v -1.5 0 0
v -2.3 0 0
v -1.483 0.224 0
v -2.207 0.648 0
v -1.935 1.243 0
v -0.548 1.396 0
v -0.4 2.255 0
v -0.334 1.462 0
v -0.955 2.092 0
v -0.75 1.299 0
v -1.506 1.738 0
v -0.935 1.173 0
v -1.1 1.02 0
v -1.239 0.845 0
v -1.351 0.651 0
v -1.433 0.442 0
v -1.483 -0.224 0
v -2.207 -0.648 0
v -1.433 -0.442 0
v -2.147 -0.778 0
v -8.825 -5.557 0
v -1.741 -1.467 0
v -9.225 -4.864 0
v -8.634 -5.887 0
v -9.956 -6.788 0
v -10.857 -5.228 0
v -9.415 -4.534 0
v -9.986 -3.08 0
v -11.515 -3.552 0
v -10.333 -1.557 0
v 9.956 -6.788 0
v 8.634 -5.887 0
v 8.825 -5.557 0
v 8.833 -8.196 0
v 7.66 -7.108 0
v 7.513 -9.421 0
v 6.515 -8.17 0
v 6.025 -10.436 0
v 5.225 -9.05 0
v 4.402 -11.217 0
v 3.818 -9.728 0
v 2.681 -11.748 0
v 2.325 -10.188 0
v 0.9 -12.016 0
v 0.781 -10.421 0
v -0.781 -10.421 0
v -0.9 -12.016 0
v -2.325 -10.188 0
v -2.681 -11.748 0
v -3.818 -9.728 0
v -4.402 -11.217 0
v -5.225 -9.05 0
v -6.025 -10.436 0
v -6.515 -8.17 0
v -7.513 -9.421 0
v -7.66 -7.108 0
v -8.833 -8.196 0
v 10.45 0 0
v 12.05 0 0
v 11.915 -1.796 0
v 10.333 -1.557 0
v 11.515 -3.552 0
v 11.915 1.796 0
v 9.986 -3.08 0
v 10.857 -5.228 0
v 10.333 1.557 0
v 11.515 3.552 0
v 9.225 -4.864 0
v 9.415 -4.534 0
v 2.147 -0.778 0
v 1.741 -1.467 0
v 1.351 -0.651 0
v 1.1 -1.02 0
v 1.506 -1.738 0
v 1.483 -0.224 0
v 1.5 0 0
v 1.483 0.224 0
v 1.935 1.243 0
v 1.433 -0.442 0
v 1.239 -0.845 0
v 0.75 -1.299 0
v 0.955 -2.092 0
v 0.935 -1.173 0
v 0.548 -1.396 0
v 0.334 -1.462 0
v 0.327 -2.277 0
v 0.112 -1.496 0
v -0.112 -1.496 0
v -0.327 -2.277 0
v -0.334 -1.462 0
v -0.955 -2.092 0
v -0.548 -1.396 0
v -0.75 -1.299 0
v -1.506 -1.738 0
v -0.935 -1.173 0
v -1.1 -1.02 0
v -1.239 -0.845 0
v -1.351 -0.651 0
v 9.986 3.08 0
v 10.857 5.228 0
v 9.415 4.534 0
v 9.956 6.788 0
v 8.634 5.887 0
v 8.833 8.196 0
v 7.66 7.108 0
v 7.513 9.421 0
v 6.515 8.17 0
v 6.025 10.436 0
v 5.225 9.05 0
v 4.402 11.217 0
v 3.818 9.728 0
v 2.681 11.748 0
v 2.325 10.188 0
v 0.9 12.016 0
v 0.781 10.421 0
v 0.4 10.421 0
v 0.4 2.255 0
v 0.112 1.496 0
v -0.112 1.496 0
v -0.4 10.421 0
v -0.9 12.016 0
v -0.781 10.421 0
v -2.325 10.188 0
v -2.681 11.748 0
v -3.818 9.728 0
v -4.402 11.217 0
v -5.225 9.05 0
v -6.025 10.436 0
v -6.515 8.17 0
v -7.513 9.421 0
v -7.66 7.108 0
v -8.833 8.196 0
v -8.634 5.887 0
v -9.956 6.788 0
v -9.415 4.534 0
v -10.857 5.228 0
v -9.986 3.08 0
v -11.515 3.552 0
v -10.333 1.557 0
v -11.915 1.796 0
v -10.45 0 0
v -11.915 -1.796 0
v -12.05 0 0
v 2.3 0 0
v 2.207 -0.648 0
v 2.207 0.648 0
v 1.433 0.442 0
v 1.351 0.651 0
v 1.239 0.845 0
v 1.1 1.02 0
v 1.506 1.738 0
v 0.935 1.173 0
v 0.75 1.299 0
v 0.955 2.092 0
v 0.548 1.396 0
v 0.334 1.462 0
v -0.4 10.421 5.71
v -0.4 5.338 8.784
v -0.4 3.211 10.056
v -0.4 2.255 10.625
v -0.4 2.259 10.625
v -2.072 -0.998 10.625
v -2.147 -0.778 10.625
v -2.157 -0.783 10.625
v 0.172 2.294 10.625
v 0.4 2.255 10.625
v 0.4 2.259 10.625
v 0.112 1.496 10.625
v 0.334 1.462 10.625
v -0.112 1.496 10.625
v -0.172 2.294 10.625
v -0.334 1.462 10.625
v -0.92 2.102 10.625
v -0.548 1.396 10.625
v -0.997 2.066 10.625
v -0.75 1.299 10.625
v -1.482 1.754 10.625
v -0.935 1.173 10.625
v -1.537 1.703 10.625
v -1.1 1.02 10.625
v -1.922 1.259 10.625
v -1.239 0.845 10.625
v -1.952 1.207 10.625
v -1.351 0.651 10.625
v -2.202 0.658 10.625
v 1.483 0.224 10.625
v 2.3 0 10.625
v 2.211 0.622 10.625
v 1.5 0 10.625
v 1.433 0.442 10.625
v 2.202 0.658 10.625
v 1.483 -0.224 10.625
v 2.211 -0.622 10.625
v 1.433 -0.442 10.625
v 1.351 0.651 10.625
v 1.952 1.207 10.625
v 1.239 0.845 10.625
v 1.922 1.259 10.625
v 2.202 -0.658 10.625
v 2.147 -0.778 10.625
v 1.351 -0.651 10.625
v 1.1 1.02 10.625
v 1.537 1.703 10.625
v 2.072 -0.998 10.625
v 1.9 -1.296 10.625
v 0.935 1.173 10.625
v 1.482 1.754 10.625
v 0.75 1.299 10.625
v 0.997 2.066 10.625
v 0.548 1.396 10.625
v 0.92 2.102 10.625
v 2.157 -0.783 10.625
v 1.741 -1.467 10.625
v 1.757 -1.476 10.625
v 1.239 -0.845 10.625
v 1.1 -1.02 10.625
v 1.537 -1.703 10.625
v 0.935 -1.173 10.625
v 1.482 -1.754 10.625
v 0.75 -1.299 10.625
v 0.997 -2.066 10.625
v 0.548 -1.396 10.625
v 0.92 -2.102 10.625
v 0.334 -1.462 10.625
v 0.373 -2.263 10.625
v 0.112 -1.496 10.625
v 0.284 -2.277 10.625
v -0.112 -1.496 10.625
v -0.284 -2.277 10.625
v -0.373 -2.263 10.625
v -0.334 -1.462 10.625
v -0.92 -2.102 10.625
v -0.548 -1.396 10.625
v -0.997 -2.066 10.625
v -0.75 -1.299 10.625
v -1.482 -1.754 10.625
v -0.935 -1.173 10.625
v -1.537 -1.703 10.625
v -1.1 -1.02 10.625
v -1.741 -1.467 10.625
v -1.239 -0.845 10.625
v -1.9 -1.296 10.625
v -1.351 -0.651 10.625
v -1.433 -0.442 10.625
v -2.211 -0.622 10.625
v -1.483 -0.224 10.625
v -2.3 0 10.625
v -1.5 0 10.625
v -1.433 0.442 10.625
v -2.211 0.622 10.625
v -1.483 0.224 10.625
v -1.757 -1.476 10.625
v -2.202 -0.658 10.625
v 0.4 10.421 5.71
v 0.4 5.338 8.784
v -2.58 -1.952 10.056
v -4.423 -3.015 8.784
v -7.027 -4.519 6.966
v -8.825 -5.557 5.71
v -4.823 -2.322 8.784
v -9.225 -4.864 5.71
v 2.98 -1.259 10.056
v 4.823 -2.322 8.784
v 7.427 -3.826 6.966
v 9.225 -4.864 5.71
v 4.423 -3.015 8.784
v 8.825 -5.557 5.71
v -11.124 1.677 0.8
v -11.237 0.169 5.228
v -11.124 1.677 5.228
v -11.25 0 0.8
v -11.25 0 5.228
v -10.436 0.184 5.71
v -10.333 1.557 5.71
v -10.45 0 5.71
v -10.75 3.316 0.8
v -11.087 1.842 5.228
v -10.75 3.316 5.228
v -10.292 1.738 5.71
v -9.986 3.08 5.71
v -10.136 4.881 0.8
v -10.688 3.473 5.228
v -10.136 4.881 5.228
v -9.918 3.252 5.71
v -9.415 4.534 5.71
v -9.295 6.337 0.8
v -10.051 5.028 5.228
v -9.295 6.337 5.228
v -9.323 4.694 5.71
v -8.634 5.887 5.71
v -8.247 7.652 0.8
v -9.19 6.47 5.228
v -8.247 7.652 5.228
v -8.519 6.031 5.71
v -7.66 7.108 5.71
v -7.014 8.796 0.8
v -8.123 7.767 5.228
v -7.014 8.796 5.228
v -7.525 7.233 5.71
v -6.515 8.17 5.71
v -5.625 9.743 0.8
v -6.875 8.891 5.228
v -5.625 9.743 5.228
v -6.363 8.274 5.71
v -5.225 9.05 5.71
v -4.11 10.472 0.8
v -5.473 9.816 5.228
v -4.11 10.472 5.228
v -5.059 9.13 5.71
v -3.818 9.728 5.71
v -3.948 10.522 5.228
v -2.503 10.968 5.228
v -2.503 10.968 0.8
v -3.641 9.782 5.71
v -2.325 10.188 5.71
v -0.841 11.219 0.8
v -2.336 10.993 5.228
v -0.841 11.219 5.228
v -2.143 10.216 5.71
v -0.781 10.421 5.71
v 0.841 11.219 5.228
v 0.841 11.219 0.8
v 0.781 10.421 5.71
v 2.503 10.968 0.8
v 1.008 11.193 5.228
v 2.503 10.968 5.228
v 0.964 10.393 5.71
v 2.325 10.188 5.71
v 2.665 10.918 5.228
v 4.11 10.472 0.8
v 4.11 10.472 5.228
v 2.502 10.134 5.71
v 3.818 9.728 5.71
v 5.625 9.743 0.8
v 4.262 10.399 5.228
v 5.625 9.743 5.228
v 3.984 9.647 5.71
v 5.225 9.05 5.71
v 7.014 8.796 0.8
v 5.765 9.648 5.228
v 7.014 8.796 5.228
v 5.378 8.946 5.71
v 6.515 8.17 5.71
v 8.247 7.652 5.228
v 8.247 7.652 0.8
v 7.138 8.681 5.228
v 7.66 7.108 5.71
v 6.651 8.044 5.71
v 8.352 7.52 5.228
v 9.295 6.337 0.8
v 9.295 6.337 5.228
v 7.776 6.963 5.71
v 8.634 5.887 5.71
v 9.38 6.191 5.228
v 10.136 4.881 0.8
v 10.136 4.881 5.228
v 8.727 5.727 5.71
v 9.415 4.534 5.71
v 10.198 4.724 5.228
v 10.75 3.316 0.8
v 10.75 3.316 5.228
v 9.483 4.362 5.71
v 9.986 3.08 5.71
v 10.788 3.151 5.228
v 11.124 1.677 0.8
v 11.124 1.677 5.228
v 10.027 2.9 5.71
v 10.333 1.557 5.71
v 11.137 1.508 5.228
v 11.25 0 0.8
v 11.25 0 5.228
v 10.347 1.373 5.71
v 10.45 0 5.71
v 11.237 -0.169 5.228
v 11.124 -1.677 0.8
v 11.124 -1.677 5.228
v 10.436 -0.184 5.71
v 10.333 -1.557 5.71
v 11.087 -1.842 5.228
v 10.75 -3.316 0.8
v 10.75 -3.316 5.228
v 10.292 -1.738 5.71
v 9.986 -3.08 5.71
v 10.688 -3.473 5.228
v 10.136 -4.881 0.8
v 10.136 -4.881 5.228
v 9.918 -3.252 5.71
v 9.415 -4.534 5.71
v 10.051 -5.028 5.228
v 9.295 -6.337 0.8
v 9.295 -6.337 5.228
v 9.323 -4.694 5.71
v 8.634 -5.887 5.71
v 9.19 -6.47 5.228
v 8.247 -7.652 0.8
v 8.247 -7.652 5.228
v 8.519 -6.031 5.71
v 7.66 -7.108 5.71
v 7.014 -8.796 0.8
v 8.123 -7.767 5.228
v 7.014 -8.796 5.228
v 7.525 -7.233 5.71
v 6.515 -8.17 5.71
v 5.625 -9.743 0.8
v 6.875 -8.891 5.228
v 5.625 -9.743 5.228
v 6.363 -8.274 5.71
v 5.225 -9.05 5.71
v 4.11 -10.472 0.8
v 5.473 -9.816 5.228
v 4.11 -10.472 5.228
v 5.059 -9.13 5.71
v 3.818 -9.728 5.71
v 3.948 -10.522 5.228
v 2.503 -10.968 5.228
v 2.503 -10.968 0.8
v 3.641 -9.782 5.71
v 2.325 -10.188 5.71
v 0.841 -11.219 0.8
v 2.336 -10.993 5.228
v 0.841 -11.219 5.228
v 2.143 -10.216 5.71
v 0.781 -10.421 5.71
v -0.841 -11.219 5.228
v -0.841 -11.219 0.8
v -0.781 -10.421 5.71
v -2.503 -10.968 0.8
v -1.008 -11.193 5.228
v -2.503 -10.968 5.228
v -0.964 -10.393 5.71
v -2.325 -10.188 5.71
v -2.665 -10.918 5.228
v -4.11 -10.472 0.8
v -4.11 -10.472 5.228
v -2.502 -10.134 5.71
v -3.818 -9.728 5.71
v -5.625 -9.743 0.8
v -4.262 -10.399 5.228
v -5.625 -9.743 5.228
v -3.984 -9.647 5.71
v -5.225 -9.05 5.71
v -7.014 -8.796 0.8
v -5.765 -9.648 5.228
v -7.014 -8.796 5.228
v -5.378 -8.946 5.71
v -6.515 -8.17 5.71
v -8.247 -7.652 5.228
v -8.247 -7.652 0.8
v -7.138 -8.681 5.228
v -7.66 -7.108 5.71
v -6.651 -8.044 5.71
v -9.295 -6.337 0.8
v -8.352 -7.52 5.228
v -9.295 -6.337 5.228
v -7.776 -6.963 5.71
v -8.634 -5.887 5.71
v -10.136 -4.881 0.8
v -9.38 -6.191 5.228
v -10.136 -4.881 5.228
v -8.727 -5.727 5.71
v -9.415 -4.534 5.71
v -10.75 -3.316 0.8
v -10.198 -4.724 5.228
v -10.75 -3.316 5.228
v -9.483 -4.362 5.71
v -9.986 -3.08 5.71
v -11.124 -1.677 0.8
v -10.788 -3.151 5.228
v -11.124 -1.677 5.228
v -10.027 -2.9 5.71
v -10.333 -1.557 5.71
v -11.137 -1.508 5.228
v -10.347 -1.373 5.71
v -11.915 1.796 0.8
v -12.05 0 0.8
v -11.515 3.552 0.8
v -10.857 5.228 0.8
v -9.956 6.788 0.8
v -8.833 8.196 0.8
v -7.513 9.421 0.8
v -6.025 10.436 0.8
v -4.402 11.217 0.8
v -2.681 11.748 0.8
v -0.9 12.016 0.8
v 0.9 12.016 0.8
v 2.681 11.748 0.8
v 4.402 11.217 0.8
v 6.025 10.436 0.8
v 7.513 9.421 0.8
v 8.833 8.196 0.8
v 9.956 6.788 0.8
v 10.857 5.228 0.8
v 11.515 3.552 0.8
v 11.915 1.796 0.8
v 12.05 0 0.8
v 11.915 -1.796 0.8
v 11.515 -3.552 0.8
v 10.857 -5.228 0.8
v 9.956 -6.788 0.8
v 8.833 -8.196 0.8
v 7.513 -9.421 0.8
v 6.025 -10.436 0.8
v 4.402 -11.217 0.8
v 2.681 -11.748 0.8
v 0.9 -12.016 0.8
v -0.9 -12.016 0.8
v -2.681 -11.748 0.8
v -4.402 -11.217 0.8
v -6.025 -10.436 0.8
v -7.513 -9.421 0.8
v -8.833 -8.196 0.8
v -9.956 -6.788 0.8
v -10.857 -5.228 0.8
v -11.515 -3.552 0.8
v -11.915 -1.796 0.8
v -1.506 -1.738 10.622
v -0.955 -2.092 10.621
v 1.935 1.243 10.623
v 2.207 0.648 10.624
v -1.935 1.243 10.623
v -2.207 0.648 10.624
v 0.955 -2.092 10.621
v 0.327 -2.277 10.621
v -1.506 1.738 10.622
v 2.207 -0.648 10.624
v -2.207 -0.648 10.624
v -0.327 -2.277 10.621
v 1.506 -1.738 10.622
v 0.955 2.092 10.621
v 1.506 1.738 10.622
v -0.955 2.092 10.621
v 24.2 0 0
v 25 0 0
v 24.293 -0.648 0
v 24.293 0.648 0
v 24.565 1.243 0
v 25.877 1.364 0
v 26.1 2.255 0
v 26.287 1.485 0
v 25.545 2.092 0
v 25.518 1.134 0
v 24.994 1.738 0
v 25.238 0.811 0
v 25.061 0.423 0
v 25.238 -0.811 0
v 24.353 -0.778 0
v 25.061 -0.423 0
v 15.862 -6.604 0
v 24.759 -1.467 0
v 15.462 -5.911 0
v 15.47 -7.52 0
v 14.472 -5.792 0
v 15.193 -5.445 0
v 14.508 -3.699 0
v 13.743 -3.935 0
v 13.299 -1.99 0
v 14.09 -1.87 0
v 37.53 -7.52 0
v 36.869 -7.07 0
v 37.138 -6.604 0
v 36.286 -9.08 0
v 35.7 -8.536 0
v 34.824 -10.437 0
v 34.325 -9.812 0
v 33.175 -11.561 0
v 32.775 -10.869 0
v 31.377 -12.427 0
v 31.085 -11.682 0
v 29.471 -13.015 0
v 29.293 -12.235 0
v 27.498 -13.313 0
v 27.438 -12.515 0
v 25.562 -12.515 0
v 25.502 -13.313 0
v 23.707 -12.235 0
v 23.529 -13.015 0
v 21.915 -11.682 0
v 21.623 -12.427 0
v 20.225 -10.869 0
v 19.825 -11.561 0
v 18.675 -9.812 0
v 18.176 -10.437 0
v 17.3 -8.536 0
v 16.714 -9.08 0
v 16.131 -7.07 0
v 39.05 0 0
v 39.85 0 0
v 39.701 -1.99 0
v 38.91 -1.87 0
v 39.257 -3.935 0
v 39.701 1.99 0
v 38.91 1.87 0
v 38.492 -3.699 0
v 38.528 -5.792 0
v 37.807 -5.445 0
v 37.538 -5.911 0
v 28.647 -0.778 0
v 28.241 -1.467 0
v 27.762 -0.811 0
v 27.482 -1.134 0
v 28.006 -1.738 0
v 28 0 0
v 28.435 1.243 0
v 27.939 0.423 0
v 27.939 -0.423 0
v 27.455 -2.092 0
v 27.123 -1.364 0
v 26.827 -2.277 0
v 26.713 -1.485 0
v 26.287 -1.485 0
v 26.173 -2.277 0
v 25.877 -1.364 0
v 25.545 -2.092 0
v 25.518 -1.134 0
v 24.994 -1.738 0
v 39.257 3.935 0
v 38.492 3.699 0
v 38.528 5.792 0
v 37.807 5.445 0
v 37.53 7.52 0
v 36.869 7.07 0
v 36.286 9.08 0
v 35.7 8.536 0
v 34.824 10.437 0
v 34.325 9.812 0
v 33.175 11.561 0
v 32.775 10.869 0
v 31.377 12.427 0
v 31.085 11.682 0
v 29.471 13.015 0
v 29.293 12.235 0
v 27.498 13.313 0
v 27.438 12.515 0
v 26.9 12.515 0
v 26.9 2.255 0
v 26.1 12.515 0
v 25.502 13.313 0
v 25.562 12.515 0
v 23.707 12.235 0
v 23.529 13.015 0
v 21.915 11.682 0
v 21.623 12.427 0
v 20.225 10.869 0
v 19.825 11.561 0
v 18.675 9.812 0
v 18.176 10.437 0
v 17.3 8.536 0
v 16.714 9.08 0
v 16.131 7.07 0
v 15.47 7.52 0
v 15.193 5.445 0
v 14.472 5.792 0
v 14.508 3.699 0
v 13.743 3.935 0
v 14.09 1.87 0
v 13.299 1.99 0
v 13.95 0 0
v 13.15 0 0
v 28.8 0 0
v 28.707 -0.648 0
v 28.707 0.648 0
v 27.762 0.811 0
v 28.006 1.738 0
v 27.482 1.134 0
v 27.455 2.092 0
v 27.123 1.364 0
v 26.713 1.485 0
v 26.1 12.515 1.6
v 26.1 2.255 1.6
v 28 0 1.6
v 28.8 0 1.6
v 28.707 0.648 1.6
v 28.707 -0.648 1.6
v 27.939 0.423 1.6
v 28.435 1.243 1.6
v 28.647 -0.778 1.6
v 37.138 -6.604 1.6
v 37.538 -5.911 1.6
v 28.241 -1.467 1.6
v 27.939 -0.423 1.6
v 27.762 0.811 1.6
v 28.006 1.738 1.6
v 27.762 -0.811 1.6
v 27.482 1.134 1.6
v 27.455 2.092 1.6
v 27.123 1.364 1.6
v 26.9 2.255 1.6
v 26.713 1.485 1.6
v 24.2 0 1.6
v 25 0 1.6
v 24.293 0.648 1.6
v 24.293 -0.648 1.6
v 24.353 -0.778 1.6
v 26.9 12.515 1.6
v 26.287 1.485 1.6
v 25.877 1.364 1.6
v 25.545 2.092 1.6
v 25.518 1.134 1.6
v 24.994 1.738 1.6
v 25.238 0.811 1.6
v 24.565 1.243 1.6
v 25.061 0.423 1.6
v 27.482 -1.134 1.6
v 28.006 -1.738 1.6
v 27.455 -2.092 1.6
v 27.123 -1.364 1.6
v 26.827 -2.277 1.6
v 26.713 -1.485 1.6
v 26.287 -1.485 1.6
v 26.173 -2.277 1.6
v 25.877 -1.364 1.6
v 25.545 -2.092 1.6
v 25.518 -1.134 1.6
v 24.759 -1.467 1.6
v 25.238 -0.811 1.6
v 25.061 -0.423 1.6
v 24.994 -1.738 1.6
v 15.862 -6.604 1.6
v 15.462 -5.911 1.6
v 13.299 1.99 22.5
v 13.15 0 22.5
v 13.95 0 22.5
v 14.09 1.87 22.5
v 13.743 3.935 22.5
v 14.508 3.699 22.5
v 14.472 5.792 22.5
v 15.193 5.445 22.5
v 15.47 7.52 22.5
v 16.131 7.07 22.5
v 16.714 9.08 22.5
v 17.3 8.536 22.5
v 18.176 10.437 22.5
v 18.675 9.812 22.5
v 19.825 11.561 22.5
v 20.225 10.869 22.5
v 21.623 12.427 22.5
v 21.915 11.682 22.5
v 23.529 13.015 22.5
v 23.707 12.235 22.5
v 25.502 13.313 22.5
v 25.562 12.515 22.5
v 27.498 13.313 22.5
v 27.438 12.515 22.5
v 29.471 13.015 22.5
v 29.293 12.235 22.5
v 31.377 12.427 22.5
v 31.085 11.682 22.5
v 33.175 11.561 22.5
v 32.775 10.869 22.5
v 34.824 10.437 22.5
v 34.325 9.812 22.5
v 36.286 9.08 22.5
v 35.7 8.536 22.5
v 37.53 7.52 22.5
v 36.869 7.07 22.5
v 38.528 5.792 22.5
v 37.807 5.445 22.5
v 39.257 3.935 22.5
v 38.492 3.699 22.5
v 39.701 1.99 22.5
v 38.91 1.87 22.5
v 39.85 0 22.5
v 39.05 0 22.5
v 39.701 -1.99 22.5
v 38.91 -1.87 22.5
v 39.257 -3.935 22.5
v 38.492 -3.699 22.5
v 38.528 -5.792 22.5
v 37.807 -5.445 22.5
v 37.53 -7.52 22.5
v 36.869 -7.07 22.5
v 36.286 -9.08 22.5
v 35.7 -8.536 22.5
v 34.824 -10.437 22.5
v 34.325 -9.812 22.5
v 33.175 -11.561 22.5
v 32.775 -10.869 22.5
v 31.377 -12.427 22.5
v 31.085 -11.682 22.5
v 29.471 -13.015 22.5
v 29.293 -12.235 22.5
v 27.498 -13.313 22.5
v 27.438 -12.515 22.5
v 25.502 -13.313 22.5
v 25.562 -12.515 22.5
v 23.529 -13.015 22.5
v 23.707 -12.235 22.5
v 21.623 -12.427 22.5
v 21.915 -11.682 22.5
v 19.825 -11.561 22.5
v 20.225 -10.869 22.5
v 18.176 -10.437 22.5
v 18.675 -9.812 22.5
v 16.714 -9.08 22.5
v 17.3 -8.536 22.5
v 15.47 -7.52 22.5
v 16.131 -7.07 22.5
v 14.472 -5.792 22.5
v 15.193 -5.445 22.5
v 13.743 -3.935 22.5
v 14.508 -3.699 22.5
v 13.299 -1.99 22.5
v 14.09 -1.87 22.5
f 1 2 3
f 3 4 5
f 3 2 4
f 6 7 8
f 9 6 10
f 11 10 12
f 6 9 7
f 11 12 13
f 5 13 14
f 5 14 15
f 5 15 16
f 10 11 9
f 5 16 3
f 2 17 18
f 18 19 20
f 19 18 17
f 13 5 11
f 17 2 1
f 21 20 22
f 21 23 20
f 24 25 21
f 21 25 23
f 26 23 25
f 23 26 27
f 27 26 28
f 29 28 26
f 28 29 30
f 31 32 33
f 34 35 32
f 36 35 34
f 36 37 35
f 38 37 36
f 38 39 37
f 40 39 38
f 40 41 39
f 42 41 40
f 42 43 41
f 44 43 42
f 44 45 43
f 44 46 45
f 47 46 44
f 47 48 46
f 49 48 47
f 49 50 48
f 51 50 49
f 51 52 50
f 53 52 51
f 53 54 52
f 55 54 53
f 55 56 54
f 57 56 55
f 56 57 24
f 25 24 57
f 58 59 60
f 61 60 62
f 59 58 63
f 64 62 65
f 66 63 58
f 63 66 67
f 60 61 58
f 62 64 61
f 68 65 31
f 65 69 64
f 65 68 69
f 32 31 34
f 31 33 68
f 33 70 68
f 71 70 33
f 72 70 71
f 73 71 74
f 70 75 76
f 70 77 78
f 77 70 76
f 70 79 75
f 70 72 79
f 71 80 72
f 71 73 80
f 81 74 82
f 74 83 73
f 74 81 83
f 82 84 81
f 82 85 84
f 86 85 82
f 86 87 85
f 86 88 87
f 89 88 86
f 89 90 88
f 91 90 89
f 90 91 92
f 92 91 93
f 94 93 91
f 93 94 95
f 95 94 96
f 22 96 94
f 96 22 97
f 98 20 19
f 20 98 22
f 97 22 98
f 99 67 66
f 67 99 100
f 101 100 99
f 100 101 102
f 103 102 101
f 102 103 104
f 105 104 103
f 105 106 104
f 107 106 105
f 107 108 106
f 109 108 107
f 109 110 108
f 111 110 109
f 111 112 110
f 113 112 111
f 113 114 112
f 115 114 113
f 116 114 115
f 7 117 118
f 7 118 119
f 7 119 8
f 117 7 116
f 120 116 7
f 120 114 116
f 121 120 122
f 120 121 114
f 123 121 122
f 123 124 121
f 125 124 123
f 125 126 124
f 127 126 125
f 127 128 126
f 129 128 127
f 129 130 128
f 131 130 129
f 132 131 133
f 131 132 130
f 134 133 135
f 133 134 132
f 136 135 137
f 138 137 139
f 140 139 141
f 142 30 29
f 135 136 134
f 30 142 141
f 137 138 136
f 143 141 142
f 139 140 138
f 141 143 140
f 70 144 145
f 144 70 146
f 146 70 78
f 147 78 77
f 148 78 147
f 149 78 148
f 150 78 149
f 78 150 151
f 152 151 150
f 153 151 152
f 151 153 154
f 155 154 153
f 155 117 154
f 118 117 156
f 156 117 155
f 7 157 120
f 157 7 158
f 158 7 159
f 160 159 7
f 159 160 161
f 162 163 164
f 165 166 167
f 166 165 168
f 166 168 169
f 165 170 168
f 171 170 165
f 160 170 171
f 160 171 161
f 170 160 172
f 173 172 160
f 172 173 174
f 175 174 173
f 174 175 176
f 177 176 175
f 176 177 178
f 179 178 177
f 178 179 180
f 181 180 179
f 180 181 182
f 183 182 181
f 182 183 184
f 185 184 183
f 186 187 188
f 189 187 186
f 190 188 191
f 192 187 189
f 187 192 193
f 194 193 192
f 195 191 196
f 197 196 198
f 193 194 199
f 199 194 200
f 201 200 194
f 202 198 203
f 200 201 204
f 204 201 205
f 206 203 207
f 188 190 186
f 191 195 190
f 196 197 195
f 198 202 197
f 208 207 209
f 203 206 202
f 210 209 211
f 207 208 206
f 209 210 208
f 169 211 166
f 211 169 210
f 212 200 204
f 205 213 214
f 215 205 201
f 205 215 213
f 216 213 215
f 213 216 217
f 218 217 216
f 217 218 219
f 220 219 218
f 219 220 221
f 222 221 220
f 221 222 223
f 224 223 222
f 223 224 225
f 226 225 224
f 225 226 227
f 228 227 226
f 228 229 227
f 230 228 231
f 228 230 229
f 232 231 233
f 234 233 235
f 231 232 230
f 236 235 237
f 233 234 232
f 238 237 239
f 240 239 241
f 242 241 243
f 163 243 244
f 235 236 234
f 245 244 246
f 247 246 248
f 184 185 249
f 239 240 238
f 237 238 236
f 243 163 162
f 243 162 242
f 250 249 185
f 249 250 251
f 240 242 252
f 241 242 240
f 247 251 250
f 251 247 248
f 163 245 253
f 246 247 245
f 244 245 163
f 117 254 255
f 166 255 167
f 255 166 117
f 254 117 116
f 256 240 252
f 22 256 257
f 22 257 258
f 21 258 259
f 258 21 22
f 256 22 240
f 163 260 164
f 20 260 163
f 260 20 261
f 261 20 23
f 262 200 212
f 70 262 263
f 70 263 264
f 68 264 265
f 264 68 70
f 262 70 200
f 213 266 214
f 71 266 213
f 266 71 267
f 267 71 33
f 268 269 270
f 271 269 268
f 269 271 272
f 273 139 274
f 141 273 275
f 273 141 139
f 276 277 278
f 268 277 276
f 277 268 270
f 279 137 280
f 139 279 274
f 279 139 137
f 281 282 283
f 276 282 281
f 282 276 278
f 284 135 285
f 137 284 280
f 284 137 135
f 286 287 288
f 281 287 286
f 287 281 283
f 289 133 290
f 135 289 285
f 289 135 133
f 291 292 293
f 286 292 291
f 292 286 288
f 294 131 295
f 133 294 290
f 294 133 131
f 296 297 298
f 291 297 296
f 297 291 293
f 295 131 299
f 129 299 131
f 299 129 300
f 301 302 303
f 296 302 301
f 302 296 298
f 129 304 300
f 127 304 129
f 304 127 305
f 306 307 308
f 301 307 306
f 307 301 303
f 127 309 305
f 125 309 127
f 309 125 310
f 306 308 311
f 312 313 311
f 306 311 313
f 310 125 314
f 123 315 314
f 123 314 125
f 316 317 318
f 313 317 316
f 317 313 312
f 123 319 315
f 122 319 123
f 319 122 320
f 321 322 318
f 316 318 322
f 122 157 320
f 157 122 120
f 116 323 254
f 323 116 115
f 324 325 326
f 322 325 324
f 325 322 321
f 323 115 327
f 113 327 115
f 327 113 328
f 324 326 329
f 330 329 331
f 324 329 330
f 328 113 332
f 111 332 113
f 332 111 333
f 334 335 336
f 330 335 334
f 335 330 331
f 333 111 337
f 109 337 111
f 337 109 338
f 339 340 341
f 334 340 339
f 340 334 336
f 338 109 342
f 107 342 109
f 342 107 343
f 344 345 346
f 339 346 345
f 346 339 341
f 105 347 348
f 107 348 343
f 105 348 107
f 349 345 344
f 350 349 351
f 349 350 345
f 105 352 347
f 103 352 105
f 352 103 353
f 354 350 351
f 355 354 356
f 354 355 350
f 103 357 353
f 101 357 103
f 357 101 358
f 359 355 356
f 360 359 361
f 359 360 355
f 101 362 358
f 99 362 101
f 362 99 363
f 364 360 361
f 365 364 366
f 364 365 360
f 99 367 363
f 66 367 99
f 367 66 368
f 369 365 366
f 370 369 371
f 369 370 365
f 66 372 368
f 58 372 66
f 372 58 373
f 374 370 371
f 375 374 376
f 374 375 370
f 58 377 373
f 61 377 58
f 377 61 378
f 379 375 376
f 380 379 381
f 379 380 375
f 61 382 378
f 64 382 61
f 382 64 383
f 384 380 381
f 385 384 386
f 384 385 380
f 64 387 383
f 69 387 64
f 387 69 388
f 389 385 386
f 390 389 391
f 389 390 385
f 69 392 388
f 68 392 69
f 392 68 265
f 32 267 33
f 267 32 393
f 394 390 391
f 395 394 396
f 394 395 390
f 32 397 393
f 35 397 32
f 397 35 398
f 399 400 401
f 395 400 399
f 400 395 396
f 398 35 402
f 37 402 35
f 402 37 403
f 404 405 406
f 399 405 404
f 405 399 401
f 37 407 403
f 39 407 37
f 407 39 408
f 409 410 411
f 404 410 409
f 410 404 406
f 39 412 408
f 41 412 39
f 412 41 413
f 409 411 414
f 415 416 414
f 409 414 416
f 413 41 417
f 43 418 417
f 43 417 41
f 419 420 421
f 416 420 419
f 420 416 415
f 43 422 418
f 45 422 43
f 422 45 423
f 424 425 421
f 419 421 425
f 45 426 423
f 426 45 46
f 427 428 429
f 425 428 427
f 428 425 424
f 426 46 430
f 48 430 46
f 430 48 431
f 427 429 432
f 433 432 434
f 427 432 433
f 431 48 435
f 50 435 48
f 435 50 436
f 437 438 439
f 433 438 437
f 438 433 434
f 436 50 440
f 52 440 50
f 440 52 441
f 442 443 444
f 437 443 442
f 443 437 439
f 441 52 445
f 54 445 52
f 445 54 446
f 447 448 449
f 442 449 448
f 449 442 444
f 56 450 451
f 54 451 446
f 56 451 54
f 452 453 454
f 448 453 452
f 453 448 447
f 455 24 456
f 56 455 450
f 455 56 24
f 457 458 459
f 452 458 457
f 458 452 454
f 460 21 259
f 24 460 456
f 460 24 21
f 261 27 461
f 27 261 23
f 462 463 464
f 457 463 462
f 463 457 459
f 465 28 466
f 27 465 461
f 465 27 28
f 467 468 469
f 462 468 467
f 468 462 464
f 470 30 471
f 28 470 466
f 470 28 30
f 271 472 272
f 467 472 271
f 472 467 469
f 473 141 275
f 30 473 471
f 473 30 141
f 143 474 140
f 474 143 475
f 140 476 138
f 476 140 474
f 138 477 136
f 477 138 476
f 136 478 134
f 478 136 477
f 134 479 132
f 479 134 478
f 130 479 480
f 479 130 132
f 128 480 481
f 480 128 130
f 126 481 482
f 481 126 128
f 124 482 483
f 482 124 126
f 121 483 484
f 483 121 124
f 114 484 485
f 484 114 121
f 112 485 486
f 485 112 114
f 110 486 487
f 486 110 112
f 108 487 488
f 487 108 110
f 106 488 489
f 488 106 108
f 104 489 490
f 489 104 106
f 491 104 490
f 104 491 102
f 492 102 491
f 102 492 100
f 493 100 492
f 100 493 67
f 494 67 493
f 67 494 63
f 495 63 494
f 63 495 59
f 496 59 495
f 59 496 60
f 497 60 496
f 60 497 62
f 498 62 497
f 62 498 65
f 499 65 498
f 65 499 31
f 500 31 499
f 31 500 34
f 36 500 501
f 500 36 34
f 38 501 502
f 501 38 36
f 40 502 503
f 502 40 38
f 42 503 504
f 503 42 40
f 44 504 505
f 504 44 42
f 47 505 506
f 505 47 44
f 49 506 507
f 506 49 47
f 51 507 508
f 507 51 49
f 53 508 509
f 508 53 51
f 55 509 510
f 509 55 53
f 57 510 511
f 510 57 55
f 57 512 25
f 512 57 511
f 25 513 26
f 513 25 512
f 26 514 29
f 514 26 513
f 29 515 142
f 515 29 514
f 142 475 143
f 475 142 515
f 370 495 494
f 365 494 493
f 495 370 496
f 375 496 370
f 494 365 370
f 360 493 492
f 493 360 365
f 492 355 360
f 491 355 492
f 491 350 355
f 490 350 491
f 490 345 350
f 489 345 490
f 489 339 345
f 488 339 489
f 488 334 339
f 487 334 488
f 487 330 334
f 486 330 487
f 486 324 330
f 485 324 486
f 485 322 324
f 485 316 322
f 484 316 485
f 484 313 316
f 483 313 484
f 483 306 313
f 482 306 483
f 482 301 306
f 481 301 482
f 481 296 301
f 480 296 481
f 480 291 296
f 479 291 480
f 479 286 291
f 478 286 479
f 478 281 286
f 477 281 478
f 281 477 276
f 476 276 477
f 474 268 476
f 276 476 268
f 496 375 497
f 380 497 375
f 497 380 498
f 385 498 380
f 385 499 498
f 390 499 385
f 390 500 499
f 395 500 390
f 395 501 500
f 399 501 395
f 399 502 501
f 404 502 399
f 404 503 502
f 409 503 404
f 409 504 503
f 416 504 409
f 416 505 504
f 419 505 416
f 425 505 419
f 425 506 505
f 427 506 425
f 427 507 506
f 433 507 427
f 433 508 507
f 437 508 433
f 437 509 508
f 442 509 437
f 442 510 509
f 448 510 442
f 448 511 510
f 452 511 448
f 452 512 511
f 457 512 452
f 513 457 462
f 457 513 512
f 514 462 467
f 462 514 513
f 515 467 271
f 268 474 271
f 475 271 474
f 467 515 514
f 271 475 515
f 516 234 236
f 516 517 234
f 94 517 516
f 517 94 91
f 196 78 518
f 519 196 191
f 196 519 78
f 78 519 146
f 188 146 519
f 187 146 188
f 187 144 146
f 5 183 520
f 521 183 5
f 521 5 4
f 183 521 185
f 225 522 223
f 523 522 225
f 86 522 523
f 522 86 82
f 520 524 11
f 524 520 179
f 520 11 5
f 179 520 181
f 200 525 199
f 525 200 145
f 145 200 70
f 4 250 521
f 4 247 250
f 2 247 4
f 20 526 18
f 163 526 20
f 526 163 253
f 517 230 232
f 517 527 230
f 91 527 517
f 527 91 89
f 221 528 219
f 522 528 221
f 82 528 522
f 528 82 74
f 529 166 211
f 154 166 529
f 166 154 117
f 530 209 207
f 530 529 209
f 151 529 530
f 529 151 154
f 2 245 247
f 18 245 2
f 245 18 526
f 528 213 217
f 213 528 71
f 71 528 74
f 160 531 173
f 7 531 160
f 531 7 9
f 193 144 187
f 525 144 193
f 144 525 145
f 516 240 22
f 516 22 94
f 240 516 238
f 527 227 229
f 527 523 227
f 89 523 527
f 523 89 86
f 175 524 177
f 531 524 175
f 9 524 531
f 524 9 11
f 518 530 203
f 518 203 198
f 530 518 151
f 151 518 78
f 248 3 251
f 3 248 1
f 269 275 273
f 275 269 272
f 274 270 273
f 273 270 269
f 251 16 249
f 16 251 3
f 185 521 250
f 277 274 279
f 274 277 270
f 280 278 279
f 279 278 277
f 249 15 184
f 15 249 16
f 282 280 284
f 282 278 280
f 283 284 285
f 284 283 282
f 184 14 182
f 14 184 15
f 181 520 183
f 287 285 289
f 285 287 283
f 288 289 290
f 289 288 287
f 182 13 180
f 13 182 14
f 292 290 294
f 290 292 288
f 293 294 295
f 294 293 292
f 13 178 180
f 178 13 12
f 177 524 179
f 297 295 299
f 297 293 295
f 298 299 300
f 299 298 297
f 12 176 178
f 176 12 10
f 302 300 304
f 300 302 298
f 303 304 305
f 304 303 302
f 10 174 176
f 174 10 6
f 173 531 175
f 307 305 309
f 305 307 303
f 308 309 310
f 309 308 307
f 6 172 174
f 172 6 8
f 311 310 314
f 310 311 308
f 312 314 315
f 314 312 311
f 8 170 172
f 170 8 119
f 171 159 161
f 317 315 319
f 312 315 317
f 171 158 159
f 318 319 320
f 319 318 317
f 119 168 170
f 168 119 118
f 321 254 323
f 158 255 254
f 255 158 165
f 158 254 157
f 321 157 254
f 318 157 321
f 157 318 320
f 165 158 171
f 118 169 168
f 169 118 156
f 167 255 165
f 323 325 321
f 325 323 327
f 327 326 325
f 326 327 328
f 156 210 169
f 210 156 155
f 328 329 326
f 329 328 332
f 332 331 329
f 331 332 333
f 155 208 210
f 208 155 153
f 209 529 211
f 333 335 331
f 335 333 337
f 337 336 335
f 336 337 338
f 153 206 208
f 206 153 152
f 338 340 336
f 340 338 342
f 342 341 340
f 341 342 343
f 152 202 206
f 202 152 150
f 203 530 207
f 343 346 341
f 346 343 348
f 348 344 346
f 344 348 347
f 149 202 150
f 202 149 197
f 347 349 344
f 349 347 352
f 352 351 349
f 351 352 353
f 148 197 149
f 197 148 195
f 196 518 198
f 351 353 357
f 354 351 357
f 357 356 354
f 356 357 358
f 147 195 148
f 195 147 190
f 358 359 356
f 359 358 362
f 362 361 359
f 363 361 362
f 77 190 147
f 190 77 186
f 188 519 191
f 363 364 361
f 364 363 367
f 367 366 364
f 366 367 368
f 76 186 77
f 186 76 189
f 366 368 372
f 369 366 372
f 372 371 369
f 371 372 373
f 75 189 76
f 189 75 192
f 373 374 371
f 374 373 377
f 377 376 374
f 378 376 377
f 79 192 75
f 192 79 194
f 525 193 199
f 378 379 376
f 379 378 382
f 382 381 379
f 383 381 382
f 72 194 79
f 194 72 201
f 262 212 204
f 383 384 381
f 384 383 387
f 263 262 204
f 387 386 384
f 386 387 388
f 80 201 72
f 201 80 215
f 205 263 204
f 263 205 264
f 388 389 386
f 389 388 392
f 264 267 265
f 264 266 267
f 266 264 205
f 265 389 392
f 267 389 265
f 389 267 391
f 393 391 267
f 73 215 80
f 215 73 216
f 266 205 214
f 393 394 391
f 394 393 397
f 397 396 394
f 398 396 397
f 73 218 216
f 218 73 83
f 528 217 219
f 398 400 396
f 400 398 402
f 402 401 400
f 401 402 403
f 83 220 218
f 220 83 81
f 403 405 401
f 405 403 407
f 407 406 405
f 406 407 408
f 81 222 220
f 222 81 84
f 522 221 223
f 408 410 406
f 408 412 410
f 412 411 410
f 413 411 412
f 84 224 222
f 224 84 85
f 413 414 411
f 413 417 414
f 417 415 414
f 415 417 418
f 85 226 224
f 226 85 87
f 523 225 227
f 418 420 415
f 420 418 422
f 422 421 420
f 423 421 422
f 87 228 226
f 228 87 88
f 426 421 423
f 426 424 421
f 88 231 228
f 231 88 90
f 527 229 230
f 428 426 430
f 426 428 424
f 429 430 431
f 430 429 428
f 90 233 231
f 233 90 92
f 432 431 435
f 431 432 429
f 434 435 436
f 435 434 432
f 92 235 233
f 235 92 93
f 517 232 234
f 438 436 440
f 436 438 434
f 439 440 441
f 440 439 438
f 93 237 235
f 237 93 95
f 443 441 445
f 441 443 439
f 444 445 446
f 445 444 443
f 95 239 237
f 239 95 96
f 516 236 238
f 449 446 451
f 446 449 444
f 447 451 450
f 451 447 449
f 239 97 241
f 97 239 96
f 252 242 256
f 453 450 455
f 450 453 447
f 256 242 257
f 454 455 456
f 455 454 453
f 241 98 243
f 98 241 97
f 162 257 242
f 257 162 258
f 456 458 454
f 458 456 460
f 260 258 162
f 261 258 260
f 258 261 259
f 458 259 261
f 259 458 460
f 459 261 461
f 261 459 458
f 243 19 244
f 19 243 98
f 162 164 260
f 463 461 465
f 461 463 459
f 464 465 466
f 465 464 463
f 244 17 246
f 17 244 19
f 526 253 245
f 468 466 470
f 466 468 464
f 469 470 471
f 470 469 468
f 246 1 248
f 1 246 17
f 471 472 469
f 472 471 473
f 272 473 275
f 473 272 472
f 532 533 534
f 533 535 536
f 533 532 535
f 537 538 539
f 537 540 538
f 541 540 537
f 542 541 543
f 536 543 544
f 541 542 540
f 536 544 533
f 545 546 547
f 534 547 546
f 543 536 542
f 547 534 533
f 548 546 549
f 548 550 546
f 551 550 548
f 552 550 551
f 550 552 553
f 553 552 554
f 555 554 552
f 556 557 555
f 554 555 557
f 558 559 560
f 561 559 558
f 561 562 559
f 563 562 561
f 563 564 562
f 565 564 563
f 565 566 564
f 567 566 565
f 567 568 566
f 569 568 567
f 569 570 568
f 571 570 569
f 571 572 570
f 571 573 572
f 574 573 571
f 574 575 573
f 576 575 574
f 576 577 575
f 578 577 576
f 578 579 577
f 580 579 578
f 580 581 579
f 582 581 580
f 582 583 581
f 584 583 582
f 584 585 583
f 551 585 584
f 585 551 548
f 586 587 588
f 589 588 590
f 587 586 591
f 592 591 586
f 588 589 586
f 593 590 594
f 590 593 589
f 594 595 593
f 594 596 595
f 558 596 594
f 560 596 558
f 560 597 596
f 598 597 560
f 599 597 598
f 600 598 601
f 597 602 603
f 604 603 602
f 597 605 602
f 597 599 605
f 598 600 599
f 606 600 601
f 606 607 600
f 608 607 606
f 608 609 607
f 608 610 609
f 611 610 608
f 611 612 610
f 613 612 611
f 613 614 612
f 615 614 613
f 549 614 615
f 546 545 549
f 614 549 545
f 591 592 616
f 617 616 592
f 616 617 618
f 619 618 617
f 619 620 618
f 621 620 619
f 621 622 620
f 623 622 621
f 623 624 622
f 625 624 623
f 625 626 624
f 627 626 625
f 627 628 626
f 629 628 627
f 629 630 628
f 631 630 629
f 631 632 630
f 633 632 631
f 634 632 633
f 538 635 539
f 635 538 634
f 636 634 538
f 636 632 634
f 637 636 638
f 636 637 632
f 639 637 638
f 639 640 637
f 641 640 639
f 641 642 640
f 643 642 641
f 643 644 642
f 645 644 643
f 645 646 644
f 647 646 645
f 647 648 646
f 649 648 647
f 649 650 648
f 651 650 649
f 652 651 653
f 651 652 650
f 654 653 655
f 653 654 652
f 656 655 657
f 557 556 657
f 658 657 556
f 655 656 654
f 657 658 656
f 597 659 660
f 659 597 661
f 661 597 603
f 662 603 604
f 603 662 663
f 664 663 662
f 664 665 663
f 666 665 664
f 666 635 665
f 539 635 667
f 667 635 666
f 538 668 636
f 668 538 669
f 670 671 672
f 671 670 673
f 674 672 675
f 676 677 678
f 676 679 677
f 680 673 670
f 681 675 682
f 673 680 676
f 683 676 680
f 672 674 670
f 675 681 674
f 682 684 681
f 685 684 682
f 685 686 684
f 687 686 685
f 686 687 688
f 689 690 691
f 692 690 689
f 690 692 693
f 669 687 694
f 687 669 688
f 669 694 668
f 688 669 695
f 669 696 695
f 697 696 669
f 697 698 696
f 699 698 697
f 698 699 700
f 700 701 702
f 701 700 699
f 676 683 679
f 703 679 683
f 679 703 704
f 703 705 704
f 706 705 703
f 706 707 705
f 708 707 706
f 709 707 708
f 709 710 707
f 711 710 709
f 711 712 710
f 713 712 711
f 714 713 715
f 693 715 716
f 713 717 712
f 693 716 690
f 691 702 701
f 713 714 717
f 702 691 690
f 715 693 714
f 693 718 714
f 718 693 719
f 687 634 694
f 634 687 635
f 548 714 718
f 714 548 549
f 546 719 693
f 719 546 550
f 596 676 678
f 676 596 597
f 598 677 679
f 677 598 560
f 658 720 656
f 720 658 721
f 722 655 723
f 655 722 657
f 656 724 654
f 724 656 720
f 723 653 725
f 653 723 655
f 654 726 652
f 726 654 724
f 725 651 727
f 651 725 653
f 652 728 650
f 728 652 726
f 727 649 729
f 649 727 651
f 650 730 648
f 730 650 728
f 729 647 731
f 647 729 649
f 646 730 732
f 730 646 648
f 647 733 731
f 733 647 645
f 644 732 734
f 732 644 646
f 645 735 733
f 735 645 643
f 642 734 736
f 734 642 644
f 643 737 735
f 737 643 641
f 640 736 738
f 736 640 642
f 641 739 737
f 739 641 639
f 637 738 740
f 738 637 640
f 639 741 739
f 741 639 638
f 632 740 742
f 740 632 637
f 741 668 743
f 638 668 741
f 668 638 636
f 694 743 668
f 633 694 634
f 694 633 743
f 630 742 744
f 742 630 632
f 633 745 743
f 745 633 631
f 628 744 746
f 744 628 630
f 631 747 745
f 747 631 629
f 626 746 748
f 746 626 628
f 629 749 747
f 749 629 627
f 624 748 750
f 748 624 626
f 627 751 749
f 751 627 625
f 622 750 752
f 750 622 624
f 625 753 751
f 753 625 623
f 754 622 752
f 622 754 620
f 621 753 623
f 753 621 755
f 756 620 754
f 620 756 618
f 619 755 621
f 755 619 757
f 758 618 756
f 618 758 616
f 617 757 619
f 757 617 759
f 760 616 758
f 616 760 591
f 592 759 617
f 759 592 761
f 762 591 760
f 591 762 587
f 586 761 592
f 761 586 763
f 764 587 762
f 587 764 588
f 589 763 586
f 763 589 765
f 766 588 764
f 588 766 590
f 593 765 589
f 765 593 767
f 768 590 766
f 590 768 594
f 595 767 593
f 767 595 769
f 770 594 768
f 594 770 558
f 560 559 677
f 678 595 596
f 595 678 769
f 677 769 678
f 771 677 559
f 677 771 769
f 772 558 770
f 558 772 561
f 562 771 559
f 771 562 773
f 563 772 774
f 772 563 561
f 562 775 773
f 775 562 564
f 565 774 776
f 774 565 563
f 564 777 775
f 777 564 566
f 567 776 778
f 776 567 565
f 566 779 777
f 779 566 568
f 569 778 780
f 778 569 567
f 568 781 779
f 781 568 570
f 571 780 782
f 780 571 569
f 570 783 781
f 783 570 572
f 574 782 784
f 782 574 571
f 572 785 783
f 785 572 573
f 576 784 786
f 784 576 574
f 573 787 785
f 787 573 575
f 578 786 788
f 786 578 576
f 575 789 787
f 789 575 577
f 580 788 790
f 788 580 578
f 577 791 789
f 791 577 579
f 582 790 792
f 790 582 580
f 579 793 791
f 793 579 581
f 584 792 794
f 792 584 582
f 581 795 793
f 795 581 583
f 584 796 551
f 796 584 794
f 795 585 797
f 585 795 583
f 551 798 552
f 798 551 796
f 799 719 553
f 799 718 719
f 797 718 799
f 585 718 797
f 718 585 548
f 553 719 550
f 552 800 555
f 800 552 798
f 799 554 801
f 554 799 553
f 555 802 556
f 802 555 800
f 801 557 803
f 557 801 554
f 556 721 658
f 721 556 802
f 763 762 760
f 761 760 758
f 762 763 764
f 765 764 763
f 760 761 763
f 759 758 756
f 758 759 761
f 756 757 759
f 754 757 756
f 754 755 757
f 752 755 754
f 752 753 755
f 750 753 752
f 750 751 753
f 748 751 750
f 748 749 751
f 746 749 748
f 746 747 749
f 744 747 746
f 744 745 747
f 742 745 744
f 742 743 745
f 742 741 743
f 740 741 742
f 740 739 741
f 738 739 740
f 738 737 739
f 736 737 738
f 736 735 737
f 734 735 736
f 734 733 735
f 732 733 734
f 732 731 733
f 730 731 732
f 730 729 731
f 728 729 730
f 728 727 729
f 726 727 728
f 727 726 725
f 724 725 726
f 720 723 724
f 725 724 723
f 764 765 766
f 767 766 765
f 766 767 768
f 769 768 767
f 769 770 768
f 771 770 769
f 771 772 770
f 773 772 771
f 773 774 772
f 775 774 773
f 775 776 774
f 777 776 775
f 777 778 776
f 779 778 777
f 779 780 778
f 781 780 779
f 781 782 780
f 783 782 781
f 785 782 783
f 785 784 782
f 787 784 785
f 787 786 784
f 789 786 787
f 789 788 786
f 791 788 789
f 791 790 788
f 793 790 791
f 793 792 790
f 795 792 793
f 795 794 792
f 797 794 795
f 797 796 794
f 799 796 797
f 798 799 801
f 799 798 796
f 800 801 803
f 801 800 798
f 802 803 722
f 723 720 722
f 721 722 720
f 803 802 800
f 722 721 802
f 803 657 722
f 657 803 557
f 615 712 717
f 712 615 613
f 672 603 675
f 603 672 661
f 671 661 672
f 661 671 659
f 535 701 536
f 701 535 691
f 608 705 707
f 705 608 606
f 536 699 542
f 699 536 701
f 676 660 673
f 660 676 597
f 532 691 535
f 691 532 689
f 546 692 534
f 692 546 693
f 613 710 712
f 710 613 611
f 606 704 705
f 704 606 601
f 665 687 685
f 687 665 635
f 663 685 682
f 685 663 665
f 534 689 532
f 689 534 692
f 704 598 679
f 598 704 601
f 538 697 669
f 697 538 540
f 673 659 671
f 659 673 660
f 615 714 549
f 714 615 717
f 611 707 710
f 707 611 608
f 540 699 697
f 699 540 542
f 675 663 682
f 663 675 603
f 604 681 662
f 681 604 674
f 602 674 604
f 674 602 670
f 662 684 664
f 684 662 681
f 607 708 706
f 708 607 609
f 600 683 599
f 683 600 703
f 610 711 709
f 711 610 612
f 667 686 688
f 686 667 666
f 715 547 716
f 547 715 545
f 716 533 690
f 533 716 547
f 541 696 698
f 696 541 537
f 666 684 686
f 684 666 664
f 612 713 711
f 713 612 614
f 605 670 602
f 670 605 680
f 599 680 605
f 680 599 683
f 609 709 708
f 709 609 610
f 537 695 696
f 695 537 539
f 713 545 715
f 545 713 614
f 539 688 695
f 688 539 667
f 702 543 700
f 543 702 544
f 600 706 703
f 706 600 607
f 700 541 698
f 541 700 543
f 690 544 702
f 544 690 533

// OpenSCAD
// pipe
outerDiameter = 24.9;
innerDiameter = 22.5;

// screw
screwDiameter = 3;

// pipe specifics
minWallThickness = 0.8;

// proportions, don't touch!
innerPartHeight = 5 + innerDiameter/4;
sliderHeight = innerDiameter;
fnBig = round(outerDiameter/2) + 30;
echo(fnBig=fnBig);
fnSmall = round(outerDiameter/15) + 20;
echo(fnSmall=fnSmall);


// inner part
intersection(){
    union(){
        rotate_extrude($fn = fnBig)        
            translate([innerDiameter/2 - minWallThickness, 0, 0]) 
                square([minWallThickness, innerPartHeight], false); 
        rotate_extrude($fn = fnBig)        
            translate([innerDiameter/2 - minWallThickness, 0, 0])    
                square([minWallThickness + (outerDiameter - innerDiameter)/3, minWallThickness], false);   
        for (i = [0, 120, 240]) rotate([0, 0, i]) 
            linear_extrude (innerPartHeight) 
                translate([- minWallThickness/2, 0, 0]) 
                    square([minWallThickness, innerDiameter/2 - 0.1], false);
        cylinder(innerPartHeight, screwDiameter/2 + minWallThickness, screwDiameter/2 + minWallThickness, false, $fn = fnSmall);
    };
    rotate_extrude($fn = fnBig)  
        polygon(points=[
            [screwDiameter/2, 0],
            [outerDiameter * 0.8, 0],
            [screwDiameter/2 + minWallThickness, innerPartHeight],
            [screwDiameter/2, innerPartHeight],
        ]);
};

// outer part
translate([outerDiameter + 2 * minWallThickness, 0, 0])
difference(){
    union(){
        rotate_extrude($fn = fnBig)        
            translate([outerDiameter/2 + 0.1, 0, 0]) // 0.1mm air gap
                square([minWallThickness, sliderHeight], false);   
        for (i = [0, 120, 240]) rotate([0, 0, i]) 
            linear_extrude (2 * minWallThickness) 
                translate([- minWallThickness/2, 0, 0]) 
                    square([minWallThickness, outerDiameter/2 + 0.5], false);
        cylinder(2 * minWallThickness, screwDiameter/2 + minWallThickness, screwDiameter/2 + minWallThickness, false, $fn = fnSmall);
    };
    translate([0, 0, -1]) cylinder(innerPartHeight + 2, screwDiameter/2, screwDiameter/2, false, $fn = fnSmall);
};
